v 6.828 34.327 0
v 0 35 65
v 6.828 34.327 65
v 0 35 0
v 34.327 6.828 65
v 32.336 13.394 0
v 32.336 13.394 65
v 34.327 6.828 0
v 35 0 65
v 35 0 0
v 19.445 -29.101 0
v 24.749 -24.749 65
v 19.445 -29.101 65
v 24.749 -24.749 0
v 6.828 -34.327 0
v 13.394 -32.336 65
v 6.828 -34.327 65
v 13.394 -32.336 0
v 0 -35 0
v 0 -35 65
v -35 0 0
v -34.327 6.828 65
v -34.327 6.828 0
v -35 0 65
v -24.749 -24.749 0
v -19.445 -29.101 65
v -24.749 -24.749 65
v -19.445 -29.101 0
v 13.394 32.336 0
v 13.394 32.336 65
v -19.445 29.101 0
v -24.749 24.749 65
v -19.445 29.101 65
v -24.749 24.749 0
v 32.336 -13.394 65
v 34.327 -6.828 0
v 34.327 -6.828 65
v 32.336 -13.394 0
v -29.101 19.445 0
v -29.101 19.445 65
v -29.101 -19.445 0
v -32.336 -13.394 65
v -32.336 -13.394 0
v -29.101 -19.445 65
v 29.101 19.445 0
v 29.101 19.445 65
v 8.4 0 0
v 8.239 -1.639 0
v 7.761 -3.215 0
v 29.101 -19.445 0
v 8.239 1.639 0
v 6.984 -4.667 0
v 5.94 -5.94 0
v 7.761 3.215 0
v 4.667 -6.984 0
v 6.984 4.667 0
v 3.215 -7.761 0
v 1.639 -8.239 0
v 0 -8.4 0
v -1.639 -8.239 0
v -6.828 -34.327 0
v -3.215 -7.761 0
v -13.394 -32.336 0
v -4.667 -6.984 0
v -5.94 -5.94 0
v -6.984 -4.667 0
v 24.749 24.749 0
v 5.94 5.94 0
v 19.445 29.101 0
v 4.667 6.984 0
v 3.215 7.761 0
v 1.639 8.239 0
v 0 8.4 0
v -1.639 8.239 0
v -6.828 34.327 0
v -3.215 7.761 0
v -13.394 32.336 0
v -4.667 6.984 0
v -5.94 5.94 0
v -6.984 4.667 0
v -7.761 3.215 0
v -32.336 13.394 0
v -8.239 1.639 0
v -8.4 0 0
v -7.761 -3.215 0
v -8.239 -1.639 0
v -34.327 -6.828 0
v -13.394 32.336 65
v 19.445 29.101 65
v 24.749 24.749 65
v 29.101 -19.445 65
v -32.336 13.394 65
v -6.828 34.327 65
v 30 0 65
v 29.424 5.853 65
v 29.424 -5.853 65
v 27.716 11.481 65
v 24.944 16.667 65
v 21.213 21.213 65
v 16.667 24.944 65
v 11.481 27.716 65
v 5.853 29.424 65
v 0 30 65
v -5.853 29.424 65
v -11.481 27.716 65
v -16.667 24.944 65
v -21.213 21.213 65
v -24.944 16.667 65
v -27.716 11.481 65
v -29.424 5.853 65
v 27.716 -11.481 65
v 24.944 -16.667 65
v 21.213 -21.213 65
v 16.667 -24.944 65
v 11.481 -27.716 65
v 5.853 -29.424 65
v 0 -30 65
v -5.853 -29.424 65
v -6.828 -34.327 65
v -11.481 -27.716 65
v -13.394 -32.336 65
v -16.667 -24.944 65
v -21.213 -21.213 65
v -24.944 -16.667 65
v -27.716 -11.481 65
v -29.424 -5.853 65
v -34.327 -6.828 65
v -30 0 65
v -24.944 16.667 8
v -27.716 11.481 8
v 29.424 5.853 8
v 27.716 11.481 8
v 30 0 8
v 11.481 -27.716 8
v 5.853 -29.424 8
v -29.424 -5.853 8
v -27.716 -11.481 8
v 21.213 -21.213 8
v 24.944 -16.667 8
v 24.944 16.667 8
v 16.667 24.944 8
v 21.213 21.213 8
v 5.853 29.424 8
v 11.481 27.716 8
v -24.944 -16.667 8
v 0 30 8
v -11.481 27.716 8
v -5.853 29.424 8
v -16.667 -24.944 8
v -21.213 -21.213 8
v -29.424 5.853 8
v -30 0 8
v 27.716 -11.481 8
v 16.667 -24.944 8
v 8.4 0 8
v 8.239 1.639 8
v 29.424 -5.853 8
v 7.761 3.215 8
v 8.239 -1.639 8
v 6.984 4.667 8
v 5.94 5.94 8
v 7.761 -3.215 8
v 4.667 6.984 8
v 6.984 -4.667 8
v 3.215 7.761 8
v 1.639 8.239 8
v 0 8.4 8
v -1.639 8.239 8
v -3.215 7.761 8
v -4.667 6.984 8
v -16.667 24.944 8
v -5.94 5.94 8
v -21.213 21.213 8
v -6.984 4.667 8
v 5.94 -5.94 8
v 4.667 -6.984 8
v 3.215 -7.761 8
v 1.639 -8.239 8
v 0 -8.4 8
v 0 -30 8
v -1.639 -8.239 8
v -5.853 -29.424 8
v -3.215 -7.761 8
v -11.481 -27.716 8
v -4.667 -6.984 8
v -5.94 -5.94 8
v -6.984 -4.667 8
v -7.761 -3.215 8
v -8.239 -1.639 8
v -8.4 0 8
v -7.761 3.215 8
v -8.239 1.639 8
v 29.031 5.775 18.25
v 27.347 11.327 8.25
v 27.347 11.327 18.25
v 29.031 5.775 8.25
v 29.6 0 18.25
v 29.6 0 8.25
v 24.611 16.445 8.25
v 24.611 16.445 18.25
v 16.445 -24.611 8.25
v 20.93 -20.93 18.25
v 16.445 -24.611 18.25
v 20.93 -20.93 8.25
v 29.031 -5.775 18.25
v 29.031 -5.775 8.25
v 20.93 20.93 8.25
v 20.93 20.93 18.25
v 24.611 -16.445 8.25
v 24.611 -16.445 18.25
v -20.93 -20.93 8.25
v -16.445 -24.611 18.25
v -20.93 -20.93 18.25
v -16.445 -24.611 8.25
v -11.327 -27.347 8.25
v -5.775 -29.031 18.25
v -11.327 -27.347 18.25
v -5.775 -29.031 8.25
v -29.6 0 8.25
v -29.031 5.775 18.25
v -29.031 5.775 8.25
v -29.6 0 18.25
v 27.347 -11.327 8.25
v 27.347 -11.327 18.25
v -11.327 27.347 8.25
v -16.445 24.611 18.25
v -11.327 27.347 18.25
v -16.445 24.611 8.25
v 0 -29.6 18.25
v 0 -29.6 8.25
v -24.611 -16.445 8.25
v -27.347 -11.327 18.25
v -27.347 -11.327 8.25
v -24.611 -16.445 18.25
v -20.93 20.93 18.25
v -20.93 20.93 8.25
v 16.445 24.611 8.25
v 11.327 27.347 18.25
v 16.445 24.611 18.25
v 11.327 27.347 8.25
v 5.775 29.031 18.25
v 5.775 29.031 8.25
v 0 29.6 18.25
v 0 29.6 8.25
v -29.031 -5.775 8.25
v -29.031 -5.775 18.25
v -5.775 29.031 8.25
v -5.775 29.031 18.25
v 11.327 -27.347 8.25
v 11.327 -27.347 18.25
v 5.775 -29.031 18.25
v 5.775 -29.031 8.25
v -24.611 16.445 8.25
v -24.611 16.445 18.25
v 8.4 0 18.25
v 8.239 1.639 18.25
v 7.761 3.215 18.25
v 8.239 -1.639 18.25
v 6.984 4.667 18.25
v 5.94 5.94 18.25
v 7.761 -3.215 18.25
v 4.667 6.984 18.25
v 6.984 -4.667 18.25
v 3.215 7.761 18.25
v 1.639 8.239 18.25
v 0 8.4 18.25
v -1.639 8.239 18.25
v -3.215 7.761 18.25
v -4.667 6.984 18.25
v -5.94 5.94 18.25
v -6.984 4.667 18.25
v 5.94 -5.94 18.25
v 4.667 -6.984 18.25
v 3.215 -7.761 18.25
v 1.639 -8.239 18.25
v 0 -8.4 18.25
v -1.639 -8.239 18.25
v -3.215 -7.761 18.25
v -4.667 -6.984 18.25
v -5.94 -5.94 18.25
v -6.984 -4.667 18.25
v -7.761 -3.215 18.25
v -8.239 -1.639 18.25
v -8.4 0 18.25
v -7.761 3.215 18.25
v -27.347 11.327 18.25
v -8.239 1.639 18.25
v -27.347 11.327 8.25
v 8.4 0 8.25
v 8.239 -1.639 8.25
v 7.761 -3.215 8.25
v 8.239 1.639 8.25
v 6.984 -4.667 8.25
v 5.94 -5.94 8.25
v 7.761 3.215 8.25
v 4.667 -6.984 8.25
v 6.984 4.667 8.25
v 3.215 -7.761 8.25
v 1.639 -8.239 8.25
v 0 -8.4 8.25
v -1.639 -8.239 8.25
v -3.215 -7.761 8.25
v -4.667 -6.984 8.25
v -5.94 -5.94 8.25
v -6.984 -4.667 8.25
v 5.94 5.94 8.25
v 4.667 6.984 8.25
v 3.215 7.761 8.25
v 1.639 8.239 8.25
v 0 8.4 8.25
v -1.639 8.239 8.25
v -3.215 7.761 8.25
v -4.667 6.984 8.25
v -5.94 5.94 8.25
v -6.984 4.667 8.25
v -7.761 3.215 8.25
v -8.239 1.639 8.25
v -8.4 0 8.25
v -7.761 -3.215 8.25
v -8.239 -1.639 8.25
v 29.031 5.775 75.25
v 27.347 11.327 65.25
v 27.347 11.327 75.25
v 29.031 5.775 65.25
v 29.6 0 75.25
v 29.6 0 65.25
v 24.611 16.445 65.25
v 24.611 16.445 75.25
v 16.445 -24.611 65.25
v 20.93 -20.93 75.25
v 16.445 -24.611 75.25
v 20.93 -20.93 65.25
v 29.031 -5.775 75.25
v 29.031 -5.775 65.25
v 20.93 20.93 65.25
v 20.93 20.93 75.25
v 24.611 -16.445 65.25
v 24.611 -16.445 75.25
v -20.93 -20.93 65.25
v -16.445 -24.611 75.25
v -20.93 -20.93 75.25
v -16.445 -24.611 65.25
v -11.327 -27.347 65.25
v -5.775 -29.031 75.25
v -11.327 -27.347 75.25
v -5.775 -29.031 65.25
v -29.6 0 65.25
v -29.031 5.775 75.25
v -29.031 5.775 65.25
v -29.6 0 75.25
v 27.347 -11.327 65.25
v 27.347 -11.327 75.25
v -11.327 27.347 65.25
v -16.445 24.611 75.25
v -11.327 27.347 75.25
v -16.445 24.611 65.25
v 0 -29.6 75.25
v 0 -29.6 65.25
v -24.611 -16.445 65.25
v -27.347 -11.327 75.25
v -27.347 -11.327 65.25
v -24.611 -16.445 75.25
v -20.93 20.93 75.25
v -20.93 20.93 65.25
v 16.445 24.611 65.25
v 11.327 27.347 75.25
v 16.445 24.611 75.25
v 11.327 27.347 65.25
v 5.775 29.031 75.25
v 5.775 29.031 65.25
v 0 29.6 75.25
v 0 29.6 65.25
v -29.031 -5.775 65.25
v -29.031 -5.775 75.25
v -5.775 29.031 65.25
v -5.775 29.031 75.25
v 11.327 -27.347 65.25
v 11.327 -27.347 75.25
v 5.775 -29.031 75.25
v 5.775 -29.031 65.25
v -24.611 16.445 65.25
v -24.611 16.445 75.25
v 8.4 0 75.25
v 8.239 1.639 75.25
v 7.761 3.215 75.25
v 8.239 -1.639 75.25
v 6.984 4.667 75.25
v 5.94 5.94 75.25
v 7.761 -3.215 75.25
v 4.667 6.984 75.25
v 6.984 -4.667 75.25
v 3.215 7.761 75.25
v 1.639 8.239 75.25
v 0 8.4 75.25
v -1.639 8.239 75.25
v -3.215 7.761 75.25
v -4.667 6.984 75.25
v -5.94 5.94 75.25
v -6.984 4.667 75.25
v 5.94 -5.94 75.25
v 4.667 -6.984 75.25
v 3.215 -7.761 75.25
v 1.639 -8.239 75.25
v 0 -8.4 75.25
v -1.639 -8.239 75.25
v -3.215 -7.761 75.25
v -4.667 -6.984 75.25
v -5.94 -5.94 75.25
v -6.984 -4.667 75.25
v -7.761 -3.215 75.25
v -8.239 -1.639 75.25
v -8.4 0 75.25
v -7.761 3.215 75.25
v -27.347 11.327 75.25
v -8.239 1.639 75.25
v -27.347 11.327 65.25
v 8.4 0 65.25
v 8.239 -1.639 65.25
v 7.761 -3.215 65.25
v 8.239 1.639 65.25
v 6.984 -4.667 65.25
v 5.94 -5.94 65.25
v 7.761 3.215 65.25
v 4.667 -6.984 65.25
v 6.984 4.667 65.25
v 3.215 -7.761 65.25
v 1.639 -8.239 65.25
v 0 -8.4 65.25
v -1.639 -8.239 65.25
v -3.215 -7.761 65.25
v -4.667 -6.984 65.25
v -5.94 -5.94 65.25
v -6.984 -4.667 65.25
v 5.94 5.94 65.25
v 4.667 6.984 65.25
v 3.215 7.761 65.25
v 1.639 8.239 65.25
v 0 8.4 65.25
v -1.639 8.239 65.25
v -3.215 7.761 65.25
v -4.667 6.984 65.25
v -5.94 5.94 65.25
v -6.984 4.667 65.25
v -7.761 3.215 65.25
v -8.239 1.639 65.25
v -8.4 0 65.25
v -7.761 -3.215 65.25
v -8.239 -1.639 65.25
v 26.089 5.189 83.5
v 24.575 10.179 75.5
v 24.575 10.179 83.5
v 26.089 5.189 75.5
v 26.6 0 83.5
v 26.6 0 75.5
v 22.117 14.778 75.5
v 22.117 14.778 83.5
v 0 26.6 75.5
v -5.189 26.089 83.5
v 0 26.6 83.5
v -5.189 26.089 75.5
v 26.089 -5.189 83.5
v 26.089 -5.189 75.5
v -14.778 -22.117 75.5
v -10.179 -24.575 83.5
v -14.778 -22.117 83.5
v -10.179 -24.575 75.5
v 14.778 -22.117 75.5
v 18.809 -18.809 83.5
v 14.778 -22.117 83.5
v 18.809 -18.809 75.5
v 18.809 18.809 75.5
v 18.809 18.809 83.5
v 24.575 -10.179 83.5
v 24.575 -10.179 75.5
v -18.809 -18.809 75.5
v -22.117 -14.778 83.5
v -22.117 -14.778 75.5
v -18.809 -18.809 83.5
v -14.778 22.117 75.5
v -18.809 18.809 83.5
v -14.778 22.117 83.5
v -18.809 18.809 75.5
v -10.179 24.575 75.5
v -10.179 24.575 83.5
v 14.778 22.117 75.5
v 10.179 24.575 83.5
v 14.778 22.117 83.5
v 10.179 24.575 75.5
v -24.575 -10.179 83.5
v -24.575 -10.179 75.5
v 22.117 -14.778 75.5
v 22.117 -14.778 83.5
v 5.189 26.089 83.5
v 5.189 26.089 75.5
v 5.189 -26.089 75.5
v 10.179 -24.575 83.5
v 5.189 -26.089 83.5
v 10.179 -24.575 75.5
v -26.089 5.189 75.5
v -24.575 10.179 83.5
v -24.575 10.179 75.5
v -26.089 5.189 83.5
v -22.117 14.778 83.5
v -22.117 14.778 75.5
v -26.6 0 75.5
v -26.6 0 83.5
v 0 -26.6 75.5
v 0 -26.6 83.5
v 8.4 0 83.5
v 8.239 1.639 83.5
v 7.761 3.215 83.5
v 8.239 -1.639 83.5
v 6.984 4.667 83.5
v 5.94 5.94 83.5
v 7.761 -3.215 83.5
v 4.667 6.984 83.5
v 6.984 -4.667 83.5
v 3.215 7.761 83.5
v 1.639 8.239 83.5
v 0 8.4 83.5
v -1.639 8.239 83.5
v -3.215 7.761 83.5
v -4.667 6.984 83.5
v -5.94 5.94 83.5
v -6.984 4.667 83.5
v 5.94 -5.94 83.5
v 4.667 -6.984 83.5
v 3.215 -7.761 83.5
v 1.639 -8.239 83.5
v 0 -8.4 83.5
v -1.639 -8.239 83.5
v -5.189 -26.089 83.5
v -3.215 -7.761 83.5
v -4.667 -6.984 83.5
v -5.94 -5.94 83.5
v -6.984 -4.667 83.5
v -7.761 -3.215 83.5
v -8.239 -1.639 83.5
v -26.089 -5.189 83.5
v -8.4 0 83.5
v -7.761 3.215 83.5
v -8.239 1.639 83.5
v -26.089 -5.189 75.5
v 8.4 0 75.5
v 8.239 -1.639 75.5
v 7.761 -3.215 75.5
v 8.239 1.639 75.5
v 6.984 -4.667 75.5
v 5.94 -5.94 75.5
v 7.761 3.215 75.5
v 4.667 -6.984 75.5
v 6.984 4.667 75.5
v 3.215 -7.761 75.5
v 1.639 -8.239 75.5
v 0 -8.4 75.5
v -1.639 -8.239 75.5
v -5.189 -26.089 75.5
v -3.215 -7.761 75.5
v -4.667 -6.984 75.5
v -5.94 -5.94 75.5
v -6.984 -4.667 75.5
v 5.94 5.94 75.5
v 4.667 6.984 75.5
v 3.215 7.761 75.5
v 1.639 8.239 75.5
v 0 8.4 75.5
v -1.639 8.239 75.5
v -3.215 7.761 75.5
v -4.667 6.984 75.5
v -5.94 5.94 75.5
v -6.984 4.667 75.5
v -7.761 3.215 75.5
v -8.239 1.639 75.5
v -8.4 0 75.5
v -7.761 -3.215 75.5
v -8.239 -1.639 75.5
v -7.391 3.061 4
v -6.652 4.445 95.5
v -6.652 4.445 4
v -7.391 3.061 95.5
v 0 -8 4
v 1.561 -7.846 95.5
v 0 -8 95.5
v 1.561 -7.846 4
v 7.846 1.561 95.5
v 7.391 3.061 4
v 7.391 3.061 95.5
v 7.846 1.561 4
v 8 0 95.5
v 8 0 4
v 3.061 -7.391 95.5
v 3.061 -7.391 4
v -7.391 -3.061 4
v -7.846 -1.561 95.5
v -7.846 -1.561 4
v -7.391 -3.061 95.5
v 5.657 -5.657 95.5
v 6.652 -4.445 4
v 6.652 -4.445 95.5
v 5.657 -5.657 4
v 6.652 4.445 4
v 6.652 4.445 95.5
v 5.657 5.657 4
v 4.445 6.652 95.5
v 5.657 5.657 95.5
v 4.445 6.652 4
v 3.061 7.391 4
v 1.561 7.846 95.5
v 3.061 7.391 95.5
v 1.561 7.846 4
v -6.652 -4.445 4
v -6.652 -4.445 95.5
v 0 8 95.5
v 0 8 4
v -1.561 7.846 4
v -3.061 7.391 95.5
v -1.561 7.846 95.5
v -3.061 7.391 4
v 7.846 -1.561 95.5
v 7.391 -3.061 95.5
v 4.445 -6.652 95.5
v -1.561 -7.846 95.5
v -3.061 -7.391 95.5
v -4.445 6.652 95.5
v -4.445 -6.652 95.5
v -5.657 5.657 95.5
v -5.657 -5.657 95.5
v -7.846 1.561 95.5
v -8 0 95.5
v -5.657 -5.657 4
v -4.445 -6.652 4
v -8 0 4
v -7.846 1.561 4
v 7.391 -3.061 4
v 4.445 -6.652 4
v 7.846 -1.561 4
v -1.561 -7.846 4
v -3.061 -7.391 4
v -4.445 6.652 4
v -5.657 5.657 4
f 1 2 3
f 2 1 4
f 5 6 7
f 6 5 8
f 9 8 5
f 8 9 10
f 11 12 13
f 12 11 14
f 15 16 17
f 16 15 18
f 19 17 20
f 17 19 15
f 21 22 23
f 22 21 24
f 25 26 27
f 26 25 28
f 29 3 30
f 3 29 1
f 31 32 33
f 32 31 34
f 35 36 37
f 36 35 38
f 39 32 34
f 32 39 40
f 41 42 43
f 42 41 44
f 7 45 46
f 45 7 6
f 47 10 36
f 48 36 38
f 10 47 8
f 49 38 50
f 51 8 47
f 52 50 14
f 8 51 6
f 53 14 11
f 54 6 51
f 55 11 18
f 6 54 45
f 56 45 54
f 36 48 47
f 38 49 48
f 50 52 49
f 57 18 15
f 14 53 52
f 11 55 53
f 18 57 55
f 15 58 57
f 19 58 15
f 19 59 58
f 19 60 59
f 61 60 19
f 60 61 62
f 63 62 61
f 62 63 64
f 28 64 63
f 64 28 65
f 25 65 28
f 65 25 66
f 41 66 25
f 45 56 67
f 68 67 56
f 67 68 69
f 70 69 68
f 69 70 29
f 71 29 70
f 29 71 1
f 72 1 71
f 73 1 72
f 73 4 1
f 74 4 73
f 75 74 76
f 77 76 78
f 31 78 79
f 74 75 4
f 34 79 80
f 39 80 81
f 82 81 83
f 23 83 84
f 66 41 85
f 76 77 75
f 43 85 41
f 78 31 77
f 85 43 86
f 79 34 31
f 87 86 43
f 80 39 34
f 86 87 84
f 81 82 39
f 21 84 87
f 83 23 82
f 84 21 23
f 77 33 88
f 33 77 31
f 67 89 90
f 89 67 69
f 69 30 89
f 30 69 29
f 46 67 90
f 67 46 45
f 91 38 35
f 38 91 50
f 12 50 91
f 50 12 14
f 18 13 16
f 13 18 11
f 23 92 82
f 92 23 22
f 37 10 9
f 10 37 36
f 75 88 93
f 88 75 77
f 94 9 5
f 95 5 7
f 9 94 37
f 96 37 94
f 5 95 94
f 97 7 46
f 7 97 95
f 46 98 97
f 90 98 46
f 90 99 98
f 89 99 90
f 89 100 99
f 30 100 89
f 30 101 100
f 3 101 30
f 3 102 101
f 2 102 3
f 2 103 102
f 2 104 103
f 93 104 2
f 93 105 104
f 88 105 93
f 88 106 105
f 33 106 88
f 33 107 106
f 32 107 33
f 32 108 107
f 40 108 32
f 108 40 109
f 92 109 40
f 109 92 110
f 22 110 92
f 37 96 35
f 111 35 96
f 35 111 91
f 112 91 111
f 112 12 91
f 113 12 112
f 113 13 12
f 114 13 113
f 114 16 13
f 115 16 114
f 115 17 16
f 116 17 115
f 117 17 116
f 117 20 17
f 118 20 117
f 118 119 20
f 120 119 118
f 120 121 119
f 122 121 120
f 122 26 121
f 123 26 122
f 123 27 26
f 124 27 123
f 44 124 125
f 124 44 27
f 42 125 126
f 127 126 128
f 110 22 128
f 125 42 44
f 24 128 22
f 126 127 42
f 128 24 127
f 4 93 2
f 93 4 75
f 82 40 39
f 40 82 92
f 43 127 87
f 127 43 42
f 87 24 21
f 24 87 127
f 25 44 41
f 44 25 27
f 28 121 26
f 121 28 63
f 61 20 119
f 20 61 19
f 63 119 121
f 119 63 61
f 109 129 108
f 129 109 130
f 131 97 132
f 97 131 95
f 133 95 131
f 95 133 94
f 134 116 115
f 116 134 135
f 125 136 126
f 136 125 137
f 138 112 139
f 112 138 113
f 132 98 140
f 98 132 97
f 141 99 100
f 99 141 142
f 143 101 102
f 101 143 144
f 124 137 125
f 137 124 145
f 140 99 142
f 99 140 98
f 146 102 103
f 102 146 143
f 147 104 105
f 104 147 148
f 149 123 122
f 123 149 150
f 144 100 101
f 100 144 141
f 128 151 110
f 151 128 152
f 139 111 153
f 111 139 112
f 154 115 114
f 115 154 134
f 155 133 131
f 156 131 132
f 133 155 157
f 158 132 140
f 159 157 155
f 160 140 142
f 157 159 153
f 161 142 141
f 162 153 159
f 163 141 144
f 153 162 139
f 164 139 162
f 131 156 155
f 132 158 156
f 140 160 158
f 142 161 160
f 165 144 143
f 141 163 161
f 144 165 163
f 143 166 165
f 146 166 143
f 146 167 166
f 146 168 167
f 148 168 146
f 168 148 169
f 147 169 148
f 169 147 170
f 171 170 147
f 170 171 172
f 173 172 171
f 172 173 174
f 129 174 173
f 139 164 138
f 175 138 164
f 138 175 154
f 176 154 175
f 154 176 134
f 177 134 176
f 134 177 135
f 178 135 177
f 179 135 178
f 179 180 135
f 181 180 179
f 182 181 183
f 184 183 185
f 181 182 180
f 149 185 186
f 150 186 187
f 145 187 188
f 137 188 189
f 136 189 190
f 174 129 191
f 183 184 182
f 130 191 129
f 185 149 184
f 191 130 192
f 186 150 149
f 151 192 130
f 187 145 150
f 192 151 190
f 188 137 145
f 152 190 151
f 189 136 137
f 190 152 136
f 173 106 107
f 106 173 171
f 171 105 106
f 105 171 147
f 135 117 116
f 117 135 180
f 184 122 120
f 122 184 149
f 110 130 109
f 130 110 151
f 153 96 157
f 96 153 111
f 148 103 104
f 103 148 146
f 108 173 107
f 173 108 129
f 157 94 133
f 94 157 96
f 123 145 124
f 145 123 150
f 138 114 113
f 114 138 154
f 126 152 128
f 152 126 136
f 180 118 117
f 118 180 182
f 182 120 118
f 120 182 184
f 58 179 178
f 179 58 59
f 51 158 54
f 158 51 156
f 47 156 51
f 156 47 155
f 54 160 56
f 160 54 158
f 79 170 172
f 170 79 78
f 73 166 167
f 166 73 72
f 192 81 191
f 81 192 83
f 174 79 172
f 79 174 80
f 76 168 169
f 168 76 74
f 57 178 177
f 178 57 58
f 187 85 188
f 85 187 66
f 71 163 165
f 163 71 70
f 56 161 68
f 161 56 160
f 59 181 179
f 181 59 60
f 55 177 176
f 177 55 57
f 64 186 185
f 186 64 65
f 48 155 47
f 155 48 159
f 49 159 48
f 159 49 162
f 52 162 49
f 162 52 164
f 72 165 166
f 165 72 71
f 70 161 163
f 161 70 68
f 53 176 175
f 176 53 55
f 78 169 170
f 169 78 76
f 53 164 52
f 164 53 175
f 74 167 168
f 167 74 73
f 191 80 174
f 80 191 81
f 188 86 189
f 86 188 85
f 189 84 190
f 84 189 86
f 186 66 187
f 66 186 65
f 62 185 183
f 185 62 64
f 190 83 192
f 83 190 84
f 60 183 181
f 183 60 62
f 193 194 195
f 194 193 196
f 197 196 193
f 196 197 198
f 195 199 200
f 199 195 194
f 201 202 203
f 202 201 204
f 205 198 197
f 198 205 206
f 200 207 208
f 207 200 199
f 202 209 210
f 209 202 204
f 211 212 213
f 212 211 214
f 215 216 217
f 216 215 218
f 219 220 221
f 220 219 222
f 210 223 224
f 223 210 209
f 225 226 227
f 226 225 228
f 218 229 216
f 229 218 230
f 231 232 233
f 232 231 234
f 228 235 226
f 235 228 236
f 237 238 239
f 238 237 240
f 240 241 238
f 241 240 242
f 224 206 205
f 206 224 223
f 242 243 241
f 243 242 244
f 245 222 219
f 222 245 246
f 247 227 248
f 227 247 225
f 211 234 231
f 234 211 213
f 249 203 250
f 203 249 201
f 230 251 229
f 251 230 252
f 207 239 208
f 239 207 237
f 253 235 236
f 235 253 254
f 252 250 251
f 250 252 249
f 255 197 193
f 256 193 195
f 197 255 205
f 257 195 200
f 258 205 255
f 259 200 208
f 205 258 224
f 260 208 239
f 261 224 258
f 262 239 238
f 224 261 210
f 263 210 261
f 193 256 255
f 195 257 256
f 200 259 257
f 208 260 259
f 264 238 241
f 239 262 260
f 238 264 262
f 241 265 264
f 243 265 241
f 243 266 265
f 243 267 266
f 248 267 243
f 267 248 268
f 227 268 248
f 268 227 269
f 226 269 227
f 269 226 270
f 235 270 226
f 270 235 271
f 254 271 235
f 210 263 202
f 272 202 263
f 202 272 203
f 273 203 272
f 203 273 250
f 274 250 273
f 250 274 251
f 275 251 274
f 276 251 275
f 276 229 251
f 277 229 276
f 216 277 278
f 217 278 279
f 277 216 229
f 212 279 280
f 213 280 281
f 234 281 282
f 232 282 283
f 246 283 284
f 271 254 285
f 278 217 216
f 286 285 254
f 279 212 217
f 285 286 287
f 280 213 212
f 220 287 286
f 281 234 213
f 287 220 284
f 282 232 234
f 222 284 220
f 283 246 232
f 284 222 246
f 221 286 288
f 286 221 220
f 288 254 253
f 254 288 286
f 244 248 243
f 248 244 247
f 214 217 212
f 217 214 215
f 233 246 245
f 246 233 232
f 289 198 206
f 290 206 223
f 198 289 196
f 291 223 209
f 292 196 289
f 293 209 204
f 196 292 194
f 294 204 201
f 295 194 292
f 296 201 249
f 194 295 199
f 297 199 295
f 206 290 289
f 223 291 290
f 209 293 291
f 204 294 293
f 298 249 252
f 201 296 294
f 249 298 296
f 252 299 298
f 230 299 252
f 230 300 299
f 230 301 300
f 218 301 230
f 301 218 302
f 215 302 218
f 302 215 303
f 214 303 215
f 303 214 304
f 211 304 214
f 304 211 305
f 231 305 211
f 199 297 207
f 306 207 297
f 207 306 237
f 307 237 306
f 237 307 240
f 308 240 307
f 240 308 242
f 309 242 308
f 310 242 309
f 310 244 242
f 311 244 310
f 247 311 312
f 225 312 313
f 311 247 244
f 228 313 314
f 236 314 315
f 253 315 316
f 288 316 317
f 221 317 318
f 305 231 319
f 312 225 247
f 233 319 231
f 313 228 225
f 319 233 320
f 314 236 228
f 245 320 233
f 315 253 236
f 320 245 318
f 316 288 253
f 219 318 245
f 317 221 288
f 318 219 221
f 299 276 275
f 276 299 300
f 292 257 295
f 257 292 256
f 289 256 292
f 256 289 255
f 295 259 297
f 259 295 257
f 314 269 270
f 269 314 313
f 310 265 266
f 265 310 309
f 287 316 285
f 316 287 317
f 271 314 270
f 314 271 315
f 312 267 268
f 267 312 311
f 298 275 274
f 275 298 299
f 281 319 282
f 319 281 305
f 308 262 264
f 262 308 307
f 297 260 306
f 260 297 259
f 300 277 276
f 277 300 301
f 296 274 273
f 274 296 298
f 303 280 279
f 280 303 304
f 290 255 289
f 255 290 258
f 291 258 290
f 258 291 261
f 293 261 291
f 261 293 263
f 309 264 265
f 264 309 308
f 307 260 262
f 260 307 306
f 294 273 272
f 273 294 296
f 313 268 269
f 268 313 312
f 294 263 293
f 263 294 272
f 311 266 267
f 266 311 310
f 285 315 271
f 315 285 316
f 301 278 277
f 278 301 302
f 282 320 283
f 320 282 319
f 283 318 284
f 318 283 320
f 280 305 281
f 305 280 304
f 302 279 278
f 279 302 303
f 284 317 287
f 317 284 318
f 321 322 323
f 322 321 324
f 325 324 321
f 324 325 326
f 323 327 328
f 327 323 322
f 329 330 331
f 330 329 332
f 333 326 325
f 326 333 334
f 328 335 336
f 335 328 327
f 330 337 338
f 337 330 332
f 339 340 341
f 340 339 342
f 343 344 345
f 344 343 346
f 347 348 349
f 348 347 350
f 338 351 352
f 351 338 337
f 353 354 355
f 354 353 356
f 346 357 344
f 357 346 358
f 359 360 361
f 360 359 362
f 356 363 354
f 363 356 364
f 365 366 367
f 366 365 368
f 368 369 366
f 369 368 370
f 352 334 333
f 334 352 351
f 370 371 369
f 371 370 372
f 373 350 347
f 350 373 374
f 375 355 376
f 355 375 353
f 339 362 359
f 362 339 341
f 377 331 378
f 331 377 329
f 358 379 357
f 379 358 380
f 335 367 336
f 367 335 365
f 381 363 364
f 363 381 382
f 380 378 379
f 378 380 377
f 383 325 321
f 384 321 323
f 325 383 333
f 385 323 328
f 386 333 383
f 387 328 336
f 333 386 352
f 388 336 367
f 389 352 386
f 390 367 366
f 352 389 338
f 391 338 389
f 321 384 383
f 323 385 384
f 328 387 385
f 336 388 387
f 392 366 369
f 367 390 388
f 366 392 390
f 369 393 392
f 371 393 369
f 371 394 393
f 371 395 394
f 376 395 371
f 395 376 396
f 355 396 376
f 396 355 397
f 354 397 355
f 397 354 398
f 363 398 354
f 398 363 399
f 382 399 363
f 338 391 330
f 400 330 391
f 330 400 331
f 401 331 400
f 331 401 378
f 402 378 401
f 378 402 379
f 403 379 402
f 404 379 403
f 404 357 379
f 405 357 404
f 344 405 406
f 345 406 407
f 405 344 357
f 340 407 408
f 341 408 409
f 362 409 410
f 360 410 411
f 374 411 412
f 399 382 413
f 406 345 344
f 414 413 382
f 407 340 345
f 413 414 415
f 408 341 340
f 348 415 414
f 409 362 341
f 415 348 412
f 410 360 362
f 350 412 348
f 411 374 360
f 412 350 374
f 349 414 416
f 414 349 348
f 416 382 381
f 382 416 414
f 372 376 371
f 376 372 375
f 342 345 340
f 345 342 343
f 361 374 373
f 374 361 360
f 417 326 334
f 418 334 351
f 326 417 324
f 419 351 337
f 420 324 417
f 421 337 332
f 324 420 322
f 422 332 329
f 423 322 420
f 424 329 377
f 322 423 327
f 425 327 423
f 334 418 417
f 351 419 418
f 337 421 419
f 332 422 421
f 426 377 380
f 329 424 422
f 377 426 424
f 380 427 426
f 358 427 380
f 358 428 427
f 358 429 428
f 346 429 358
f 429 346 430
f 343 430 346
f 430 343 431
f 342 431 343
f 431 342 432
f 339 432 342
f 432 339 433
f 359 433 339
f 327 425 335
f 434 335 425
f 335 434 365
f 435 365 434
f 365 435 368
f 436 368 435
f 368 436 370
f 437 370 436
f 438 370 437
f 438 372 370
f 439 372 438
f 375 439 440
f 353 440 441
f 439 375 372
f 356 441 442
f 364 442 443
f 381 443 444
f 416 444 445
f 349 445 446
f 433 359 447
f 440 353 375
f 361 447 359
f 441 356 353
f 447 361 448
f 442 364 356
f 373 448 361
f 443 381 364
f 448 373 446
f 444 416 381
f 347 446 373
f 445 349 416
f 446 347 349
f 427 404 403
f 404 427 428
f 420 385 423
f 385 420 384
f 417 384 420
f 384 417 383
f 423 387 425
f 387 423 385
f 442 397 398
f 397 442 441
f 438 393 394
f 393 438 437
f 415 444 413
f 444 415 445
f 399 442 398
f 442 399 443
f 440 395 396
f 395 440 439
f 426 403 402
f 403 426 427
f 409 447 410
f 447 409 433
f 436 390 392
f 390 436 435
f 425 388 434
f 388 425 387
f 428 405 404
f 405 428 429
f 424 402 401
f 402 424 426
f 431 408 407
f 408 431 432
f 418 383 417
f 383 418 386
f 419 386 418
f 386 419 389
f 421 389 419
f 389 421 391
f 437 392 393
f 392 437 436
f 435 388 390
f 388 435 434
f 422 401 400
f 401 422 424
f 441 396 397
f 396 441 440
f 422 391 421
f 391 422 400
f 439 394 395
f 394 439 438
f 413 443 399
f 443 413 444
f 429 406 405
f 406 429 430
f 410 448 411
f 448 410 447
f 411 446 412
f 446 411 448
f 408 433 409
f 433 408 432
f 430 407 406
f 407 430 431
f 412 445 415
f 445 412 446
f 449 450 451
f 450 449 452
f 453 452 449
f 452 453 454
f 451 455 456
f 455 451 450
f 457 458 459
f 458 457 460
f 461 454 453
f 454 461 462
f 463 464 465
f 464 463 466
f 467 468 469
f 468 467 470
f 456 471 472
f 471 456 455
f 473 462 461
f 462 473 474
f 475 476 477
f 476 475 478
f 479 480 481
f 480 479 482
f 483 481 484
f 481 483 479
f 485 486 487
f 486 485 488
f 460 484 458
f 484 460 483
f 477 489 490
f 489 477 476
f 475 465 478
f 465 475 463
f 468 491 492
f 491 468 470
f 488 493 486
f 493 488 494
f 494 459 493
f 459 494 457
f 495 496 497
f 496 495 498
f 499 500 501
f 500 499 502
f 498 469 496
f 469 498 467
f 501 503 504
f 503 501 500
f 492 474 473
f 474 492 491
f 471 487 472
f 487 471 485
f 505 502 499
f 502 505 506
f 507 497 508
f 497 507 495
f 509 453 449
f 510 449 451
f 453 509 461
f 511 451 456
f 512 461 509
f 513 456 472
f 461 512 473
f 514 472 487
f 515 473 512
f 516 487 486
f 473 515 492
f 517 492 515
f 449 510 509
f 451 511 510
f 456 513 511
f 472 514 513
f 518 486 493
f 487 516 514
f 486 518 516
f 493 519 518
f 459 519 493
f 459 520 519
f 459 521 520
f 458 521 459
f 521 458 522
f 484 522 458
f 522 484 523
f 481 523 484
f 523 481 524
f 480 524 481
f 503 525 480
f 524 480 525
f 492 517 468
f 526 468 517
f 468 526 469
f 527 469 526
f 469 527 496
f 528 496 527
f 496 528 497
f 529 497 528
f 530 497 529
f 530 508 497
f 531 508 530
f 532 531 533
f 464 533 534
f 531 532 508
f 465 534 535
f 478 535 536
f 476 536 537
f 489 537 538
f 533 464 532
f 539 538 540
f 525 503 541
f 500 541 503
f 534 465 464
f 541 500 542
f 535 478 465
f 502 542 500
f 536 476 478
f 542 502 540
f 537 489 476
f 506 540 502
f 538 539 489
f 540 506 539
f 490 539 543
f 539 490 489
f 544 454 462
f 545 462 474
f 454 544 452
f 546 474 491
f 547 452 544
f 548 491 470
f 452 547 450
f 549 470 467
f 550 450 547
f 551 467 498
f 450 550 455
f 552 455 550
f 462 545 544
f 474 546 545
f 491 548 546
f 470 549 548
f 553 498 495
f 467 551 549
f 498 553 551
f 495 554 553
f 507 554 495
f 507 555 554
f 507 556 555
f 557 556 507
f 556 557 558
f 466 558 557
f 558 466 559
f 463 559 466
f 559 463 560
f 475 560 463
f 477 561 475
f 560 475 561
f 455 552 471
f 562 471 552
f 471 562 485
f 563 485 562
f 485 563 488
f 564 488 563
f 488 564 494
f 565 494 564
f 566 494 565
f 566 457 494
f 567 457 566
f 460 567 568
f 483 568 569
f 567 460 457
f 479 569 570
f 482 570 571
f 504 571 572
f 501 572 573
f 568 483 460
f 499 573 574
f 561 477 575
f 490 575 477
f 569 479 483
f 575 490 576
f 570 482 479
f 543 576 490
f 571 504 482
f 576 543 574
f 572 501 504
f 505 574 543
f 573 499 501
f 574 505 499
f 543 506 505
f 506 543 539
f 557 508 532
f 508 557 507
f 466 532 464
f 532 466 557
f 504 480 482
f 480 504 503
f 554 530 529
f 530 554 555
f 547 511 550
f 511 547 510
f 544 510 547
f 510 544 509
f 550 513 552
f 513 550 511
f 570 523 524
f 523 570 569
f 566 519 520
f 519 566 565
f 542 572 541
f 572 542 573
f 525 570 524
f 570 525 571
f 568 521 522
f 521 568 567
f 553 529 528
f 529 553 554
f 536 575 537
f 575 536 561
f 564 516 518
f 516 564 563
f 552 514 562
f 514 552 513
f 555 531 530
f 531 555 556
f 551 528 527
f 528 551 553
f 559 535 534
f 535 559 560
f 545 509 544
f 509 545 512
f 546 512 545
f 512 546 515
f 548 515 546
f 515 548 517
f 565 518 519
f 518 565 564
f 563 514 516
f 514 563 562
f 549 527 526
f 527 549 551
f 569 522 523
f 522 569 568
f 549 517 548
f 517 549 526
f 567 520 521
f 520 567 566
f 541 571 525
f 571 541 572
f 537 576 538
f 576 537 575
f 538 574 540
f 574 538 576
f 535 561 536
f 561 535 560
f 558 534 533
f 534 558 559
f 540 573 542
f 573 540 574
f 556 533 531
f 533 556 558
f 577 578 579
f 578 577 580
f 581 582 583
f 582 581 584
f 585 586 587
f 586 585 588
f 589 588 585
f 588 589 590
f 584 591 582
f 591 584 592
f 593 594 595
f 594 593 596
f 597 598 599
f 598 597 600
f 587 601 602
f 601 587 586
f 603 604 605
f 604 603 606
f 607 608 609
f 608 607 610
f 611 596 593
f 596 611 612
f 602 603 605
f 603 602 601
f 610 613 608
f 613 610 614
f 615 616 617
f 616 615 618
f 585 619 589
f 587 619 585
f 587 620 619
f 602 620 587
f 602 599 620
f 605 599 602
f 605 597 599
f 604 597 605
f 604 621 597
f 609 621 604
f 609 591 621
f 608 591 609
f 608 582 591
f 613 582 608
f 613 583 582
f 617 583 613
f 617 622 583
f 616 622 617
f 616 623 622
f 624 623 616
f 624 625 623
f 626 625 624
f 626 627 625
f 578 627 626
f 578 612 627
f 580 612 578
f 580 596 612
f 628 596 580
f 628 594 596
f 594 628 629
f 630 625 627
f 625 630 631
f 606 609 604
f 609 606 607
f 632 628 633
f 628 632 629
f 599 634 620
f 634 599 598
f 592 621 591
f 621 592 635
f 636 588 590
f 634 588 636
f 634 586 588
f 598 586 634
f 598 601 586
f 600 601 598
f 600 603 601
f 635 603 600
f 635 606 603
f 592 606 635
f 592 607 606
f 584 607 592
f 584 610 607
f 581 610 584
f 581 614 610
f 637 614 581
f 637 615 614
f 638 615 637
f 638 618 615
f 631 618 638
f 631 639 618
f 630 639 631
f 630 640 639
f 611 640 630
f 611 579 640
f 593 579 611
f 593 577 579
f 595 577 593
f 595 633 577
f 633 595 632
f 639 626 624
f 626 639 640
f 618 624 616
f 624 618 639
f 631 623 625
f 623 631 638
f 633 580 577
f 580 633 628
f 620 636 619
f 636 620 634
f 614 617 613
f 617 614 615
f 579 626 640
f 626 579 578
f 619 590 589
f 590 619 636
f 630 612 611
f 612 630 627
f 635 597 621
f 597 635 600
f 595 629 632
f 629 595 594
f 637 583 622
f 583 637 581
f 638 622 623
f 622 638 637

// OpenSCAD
$fn = 32;

// ------------------------------------------------------------------------
// Bearing housing: housing d70, two bearings and a shaft
// Every part is its own module, assembly() places them once.
// ------------------------------------------------------------------------

// --- part 1 ---
module housing() {
  difference() {
    cylinder(h = 65, d = 70);
    translate([0, 0, 8]) cylinder(h = 58, d = 60);
    translate([0, 0, -1]) cylinder(h = 10, d = 16.8);
  }
}

// --- part 2 ---
module bearing_lower() {
  difference() {
      translate([0, 0, 0]) cylinder(h = 10, d = 59.2);
      translate([0, 0, -1]) cylinder(h = 12, d = 16.8);
    }
}

// --- part 3 ---
module bearing_upper() {
  difference() {
      translate([0, 0, 0]) cylinder(h = 10, d = 59.2);
      translate([0, 0, -1]) cylinder(h = 12, d = 16.8);
    }
}

// --- part 4 ---
module spacer() {
  difference() {
      translate([0, 0, 0]) cylinder(h = 8, d = 53.2);
      translate([0, 0, -1]) cylinder(h = 10, d = 16.8);
    }
}

// --- part 5 ---
module shaft() {
  translate([0, 0, -45.75]) cylinder(h = 91.5, d = 16);
}

// --- assembly ---
module assembly() {
  translate([0, 0, 0]) rotate([0, 0, 0]) housing();
  translate([0, 0, 8.25]) rotate([0, 0, 0]) bearing_lower();
  translate([0, 0, 65.25]) rotate([0, 0, 0]) bearing_upper();
  translate([0, 0, 75.5]) rotate([0, 0, 0]) spacer();
  translate([0, 0, 49.75]) rotate([0, 0, 0]) shaft();
}

assembly();
